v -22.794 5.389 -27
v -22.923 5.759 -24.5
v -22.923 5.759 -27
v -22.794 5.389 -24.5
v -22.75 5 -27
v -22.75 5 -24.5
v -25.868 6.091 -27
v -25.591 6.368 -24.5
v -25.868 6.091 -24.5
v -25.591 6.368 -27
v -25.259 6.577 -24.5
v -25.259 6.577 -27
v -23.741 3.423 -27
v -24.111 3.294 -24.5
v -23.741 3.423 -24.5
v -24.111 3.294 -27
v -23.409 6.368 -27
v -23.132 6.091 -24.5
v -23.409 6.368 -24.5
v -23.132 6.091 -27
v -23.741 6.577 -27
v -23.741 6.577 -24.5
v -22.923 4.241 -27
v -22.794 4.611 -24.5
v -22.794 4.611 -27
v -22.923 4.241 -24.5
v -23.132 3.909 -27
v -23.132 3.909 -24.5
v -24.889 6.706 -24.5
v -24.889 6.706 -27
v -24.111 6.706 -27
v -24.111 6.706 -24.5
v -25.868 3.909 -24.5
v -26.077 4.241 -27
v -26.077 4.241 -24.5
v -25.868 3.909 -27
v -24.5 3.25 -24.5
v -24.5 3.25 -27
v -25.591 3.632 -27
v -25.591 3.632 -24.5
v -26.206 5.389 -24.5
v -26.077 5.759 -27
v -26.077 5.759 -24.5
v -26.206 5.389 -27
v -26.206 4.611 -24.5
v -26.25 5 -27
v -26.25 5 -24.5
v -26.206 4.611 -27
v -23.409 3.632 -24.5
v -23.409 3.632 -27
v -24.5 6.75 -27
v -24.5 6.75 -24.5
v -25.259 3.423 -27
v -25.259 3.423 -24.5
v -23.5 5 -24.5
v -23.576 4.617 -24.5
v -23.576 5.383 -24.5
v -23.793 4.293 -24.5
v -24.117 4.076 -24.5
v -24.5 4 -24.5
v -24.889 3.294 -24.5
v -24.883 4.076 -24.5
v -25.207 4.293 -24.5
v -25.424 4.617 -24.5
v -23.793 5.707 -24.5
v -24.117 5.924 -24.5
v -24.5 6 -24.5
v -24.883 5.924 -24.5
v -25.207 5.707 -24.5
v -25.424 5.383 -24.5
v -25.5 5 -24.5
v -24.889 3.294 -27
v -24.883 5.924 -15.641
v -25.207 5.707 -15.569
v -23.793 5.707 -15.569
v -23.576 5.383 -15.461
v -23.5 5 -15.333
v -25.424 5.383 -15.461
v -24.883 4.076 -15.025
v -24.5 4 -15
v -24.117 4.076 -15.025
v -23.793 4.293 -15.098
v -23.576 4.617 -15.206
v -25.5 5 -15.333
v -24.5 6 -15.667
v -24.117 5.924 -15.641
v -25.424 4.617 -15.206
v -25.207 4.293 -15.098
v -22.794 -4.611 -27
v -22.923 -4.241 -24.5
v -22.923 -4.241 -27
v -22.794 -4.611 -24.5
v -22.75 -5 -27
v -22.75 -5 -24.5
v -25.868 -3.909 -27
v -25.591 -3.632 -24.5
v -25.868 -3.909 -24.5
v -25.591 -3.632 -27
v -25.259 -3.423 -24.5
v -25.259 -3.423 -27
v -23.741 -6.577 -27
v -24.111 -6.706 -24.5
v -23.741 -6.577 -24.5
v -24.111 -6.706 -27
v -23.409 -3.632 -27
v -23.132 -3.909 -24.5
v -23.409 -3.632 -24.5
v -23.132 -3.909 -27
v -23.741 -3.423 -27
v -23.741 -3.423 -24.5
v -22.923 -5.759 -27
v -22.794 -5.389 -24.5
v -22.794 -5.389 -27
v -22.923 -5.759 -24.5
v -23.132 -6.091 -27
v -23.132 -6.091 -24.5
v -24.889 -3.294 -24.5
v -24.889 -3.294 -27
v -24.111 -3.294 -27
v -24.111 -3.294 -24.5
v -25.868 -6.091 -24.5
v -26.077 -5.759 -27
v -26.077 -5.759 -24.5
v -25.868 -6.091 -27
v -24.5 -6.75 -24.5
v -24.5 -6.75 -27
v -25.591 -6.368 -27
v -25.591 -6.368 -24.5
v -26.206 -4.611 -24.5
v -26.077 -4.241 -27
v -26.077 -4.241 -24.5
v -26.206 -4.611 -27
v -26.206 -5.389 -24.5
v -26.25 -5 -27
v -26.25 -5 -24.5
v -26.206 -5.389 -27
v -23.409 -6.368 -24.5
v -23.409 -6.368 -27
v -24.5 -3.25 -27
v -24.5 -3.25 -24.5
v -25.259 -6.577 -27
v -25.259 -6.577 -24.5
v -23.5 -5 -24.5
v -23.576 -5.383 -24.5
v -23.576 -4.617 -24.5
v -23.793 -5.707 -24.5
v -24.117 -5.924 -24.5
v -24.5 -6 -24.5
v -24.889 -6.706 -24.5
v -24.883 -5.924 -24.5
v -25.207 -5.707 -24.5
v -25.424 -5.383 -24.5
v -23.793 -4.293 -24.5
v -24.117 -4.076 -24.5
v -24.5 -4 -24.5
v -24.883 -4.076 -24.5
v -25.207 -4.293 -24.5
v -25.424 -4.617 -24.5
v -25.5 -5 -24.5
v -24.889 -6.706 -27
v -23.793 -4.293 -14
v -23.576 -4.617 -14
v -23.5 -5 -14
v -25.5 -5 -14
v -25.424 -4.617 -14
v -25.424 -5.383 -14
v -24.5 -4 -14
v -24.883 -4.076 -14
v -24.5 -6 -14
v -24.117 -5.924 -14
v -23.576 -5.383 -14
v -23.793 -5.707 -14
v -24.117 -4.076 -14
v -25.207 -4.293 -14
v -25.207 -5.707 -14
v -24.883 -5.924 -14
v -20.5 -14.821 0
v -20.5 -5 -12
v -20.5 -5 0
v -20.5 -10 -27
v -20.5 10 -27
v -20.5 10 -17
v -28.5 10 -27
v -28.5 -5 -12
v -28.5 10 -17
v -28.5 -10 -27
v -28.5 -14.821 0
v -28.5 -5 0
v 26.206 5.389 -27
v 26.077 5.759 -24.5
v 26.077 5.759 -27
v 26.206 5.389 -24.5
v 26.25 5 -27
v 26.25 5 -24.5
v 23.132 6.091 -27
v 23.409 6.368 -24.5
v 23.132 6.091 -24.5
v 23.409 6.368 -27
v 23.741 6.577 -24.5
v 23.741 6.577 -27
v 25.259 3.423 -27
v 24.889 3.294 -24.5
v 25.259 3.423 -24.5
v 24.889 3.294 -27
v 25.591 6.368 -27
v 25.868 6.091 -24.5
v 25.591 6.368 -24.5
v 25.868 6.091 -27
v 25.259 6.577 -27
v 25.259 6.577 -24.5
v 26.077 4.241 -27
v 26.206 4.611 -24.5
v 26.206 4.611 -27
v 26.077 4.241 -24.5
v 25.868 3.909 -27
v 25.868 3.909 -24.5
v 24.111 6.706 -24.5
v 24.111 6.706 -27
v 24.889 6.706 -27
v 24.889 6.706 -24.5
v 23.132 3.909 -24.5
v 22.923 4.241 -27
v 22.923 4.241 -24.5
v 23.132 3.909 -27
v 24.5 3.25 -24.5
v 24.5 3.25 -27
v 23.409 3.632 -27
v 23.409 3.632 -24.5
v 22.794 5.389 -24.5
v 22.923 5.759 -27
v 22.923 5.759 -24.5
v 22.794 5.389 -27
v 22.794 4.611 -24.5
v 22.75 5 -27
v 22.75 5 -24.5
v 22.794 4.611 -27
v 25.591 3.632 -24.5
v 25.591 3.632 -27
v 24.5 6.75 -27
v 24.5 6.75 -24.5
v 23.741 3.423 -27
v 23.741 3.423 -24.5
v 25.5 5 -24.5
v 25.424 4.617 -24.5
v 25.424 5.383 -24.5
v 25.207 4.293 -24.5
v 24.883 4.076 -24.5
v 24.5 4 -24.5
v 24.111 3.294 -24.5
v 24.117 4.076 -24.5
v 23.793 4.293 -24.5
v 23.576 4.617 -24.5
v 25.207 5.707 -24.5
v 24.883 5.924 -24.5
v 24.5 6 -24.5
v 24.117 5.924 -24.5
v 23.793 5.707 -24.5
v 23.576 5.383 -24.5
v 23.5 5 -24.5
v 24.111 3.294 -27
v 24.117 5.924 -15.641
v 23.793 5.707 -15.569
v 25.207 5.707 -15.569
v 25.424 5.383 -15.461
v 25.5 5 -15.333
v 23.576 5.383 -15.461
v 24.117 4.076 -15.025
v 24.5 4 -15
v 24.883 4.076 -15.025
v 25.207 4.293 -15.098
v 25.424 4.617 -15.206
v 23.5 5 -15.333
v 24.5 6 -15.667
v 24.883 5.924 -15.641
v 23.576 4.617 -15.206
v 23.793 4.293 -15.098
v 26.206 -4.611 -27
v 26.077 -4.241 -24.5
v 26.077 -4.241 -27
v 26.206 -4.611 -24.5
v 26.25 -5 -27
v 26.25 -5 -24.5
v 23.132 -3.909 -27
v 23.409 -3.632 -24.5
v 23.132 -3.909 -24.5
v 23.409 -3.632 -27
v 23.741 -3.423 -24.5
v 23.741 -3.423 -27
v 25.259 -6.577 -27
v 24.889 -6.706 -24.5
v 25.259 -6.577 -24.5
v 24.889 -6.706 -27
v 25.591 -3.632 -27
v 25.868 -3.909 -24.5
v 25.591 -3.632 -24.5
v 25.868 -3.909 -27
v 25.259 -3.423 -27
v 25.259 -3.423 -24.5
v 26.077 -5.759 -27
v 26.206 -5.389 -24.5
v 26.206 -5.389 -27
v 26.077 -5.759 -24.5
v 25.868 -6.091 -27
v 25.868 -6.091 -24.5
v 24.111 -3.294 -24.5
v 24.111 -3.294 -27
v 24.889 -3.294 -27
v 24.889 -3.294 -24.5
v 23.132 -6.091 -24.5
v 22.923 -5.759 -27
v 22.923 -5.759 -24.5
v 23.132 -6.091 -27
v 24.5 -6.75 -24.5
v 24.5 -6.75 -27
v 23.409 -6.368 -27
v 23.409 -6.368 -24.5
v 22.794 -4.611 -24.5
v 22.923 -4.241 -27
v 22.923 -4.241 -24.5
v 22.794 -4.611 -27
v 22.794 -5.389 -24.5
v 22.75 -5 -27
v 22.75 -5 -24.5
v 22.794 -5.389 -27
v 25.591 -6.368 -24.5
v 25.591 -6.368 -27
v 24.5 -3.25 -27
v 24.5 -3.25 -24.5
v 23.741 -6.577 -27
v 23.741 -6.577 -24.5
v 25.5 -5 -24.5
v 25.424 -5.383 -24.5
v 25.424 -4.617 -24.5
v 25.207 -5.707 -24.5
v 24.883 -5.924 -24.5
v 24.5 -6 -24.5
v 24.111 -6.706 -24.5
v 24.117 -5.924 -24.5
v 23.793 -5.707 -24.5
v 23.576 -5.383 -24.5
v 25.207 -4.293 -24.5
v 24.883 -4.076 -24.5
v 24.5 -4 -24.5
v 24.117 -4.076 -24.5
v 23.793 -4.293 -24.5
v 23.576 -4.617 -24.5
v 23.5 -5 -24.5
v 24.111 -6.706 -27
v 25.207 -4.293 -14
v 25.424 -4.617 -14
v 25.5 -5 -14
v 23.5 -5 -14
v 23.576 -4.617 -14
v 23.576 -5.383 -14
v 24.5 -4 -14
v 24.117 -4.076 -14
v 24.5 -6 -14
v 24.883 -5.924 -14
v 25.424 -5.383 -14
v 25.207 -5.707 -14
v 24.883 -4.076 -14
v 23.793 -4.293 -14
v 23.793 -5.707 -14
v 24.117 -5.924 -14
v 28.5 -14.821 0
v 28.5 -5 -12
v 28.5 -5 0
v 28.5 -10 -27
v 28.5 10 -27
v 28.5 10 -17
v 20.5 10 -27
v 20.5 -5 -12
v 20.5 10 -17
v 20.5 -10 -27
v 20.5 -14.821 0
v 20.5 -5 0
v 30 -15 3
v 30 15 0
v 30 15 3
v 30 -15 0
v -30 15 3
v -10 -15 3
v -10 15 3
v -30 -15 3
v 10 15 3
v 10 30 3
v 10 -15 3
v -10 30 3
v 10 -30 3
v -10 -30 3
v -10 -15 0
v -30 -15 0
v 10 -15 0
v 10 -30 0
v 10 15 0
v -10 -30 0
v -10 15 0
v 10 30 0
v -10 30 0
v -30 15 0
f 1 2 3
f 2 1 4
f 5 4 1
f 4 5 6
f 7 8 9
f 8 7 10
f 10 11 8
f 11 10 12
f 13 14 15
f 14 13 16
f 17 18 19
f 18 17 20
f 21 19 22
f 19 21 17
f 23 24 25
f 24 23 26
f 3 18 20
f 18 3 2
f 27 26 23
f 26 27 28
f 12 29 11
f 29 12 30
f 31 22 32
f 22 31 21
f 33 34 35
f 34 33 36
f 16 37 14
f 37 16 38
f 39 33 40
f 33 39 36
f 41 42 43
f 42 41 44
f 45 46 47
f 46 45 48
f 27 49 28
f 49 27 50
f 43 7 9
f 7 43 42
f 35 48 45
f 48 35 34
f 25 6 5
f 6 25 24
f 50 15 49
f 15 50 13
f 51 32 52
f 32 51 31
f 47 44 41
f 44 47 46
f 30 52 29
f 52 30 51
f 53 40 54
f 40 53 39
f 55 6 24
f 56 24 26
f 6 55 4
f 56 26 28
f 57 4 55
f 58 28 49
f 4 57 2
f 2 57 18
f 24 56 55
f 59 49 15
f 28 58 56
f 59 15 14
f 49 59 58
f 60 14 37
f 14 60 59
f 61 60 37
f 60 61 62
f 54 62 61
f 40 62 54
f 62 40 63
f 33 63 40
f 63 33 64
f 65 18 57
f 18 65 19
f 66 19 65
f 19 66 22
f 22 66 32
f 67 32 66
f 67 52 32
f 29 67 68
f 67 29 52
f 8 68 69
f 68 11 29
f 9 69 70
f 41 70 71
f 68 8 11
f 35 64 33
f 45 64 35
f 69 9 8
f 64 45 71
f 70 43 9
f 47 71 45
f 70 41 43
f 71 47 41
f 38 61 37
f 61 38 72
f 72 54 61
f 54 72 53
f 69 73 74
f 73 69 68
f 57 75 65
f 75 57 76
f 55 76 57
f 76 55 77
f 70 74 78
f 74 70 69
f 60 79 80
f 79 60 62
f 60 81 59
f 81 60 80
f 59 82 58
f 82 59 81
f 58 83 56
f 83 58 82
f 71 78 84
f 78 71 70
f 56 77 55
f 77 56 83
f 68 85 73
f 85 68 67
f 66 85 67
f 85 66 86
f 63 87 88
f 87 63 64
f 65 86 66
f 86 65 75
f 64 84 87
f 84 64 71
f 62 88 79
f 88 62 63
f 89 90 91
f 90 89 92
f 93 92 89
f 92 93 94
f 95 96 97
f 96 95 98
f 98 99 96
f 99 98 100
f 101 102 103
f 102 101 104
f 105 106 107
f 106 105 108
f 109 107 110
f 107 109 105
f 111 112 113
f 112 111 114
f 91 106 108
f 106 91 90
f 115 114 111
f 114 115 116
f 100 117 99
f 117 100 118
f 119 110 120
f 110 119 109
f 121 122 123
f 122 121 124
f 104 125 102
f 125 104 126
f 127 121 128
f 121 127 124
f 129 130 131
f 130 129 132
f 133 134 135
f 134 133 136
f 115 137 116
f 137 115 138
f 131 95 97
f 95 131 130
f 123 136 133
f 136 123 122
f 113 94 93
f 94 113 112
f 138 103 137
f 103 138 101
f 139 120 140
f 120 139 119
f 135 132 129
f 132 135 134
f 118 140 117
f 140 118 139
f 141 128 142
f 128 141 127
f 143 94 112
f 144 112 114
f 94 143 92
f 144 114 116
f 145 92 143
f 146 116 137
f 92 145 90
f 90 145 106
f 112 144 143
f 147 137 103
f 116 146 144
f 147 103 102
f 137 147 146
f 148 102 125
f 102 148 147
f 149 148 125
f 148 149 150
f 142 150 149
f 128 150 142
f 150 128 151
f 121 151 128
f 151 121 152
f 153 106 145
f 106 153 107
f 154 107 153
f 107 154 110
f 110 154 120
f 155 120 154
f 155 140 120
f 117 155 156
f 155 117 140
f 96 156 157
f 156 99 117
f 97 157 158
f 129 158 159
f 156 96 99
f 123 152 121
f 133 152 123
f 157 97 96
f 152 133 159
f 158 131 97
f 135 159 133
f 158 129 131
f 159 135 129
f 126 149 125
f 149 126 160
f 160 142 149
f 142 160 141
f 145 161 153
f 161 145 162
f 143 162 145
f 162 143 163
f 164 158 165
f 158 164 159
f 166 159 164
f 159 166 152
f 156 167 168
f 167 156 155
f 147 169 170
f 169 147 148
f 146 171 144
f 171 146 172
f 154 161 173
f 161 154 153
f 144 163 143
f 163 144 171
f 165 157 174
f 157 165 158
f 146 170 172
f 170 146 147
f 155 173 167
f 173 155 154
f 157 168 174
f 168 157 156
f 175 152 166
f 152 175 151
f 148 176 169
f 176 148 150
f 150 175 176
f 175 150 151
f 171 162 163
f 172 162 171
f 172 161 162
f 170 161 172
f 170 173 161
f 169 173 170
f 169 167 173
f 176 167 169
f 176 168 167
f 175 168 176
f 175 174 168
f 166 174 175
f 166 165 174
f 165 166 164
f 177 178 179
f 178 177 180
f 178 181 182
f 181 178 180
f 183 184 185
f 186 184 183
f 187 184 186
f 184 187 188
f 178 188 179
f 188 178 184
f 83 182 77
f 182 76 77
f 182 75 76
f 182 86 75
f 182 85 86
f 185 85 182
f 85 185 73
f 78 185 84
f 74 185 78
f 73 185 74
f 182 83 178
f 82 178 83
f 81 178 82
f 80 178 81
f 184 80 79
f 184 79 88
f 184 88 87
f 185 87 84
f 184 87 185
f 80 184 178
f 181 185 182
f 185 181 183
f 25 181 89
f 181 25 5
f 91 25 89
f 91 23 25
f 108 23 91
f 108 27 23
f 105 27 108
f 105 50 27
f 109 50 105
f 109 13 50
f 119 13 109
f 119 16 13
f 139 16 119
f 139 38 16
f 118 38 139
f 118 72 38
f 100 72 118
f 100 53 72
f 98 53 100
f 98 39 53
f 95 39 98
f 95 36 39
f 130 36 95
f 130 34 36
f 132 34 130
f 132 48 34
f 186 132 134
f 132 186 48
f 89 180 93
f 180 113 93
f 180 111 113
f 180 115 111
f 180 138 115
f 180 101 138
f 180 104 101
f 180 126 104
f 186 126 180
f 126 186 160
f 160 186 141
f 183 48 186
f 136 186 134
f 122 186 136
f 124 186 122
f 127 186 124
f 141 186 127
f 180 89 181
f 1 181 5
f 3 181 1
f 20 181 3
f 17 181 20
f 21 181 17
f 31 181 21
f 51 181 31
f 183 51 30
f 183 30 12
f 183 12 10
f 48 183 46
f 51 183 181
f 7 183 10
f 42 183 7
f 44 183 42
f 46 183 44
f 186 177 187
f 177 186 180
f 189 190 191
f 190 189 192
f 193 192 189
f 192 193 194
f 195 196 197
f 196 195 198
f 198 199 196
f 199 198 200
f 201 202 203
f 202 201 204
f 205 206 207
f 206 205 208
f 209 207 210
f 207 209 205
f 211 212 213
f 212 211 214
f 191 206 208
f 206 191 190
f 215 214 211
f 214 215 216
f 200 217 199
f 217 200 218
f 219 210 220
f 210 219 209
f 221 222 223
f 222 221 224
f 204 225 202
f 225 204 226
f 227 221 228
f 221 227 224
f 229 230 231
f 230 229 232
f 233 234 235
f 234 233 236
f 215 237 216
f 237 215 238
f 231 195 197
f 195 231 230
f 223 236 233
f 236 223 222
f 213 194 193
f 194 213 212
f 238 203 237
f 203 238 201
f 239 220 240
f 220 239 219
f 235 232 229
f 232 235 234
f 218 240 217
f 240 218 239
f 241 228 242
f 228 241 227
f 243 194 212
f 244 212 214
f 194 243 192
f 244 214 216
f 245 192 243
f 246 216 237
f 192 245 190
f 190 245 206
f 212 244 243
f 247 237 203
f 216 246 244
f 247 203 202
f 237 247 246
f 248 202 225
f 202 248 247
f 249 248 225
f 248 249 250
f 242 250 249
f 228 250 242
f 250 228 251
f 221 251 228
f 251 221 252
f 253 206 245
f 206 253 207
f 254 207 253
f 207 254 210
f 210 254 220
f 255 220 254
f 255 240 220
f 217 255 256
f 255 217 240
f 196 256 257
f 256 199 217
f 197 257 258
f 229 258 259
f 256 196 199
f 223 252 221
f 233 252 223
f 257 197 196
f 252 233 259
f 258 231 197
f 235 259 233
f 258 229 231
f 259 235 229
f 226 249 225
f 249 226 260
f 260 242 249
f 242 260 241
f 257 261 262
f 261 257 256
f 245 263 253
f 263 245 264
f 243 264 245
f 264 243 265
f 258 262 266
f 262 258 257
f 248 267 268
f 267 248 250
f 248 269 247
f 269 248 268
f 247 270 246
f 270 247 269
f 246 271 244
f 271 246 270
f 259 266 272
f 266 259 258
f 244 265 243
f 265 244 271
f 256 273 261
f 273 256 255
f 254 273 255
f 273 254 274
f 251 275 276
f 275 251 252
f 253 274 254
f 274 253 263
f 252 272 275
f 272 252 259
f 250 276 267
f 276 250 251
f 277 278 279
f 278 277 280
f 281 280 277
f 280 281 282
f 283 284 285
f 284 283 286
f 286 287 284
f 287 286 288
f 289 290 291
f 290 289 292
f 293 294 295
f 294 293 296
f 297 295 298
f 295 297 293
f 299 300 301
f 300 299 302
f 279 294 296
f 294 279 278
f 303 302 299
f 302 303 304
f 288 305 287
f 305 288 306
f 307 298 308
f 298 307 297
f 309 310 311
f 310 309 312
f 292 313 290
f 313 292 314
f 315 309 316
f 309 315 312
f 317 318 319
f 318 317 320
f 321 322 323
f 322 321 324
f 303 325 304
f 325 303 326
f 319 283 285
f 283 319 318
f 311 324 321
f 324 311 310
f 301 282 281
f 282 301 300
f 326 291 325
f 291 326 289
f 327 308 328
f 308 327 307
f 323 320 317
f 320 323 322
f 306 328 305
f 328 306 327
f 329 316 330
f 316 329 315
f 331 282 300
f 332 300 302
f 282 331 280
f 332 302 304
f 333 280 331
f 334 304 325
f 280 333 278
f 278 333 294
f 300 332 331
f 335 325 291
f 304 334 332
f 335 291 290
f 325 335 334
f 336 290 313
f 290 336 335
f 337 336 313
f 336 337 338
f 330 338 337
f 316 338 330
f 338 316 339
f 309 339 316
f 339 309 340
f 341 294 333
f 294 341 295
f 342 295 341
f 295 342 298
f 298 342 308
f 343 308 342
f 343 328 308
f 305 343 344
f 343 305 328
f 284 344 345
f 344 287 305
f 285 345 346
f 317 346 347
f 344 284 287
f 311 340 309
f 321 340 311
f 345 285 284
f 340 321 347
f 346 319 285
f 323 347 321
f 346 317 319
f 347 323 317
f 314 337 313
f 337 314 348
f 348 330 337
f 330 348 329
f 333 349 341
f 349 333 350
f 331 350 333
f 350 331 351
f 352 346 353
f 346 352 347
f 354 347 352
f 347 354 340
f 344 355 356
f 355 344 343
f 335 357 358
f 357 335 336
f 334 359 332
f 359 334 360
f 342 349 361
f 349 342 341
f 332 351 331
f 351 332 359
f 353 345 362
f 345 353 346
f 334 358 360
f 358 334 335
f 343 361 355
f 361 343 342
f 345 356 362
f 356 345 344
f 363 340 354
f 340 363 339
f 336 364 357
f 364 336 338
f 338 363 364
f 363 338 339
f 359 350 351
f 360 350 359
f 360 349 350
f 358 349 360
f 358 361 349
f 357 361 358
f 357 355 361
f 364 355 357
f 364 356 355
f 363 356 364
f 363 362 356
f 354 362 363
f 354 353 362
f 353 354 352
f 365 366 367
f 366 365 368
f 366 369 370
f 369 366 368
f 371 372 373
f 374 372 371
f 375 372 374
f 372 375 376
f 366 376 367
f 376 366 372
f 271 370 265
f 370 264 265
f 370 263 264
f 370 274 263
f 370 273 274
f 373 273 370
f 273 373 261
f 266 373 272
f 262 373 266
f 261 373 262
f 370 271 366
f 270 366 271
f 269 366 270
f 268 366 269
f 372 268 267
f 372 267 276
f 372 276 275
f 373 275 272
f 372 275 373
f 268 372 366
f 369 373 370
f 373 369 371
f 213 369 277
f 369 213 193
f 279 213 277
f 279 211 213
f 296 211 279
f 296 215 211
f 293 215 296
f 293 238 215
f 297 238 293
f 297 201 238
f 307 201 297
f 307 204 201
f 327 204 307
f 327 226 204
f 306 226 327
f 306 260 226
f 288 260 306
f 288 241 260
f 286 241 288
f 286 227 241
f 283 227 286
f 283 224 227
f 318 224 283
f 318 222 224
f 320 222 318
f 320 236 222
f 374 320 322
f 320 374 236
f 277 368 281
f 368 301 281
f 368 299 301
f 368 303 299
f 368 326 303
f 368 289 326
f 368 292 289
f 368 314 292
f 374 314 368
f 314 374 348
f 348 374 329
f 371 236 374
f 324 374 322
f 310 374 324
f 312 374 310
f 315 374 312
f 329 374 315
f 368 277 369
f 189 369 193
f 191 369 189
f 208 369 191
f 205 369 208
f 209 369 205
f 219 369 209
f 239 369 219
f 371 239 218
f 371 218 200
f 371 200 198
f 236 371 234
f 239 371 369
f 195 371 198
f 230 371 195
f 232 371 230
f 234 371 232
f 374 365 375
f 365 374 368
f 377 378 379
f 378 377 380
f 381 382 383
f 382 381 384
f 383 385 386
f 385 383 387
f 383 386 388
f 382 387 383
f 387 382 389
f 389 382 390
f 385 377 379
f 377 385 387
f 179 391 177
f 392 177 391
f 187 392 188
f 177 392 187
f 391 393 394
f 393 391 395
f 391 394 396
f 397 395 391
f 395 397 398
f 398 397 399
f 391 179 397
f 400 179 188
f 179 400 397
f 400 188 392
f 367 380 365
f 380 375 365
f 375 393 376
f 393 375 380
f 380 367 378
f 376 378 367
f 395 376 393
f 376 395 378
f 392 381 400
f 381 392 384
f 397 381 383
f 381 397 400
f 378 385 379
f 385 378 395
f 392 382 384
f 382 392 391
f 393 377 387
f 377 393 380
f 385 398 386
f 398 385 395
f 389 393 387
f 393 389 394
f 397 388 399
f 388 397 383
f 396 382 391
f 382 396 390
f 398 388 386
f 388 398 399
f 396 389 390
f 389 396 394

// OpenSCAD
// Connecting a servo to the case

module base() {
    difference() {
        union() {
            translate([-49/2, 0, 0])
            p1();
            
            translate([49/2, 0, 0])
            p1();
            
            translate([-30, -15, 0])
            cube([60, 30, 3]);
            
            translate([-10, -30, 0])
            cube([20, 60, 3]);
        }
    }
    
    module p1() {
        translate([0, 0, -27])
        difference() {
            
            translate([4, -10, 0])
            rotate([0, -90, 0])
            linear_extrude(8)
            polygon([[0, 0], [0, 20], [10, 20], [15, 5], [28, 5], [28, -5]]);
            
            
            translate([0, 5, -1]) {
                cylinder(d = 3.5, h = 3.5, $fs=0.4);
                cylinder(d = 2, h = 14, $fs=0.4);
            }
            translate([0, -5, -1]) {
                cylinder(d = 3.5, h = 3.5, $fs=0.4);
                cylinder(d = 2, h = 14, $fs=0.4);
            }
            
        }
    }
}
base();
